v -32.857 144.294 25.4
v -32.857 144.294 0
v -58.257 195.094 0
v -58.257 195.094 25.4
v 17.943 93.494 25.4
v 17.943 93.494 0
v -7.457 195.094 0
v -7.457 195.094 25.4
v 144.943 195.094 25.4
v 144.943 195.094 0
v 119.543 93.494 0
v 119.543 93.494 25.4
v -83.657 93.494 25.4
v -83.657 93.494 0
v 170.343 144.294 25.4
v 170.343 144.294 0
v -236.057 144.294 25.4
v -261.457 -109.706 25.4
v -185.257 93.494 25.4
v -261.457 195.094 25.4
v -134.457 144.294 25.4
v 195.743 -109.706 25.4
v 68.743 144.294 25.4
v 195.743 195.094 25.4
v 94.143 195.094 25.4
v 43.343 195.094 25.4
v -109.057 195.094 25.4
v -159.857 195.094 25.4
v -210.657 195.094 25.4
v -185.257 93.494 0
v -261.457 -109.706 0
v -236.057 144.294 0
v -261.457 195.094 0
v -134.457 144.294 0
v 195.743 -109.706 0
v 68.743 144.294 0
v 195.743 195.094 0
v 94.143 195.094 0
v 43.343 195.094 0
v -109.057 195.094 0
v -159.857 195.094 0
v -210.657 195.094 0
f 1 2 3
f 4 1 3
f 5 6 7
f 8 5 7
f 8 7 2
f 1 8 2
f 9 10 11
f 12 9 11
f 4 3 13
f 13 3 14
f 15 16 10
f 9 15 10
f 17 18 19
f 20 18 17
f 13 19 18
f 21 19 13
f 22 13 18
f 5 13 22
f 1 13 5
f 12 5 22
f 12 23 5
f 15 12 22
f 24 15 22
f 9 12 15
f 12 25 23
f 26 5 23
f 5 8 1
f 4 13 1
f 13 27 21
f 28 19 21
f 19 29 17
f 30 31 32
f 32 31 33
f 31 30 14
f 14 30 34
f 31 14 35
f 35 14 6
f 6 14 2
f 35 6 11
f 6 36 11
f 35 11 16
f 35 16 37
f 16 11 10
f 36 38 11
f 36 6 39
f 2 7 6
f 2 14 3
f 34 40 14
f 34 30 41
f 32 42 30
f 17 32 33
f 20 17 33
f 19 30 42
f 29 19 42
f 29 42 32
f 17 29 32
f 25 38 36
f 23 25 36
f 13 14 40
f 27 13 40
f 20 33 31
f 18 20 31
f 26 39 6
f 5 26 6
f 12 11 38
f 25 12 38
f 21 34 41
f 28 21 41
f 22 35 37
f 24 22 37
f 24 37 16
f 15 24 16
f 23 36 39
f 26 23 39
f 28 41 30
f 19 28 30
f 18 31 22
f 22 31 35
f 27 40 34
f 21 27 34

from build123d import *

# Parameters (mm, degrees)
F1_DEPTH = 25.4


with BuildPart() as f1:
    # F0 (on Top) → F1 (new body)
    with BuildSketch(Plane.XY):
        Polygon((-261.456966, 195.094159), (-261.456966, -109.705841), (195.743034, -109.705841), (195.743034, 195.094159), (170.343034, 144.294159), (144.943034, 195.094159), (119.543034, 93.494159), (94.143034, 195.094159), (68.743034, 144.294159), (43.343034, 195.094159), (17.943034, 93.494159), (-7.456966, 195.094159), (-32.856966, 144.294159), (-58.256966, 195.094159), (-83.656966, 93.494159), (-109.056966, 195.094159), (-134.456966, 144.294159), (-159.856966, 195.094159), (-185.256966, 93.494159), (-210.656966, 195.094159), (-236.056966, 144.294159), align=None)
    extrude(amount=F1_DEPTH)


solid = f1.part
